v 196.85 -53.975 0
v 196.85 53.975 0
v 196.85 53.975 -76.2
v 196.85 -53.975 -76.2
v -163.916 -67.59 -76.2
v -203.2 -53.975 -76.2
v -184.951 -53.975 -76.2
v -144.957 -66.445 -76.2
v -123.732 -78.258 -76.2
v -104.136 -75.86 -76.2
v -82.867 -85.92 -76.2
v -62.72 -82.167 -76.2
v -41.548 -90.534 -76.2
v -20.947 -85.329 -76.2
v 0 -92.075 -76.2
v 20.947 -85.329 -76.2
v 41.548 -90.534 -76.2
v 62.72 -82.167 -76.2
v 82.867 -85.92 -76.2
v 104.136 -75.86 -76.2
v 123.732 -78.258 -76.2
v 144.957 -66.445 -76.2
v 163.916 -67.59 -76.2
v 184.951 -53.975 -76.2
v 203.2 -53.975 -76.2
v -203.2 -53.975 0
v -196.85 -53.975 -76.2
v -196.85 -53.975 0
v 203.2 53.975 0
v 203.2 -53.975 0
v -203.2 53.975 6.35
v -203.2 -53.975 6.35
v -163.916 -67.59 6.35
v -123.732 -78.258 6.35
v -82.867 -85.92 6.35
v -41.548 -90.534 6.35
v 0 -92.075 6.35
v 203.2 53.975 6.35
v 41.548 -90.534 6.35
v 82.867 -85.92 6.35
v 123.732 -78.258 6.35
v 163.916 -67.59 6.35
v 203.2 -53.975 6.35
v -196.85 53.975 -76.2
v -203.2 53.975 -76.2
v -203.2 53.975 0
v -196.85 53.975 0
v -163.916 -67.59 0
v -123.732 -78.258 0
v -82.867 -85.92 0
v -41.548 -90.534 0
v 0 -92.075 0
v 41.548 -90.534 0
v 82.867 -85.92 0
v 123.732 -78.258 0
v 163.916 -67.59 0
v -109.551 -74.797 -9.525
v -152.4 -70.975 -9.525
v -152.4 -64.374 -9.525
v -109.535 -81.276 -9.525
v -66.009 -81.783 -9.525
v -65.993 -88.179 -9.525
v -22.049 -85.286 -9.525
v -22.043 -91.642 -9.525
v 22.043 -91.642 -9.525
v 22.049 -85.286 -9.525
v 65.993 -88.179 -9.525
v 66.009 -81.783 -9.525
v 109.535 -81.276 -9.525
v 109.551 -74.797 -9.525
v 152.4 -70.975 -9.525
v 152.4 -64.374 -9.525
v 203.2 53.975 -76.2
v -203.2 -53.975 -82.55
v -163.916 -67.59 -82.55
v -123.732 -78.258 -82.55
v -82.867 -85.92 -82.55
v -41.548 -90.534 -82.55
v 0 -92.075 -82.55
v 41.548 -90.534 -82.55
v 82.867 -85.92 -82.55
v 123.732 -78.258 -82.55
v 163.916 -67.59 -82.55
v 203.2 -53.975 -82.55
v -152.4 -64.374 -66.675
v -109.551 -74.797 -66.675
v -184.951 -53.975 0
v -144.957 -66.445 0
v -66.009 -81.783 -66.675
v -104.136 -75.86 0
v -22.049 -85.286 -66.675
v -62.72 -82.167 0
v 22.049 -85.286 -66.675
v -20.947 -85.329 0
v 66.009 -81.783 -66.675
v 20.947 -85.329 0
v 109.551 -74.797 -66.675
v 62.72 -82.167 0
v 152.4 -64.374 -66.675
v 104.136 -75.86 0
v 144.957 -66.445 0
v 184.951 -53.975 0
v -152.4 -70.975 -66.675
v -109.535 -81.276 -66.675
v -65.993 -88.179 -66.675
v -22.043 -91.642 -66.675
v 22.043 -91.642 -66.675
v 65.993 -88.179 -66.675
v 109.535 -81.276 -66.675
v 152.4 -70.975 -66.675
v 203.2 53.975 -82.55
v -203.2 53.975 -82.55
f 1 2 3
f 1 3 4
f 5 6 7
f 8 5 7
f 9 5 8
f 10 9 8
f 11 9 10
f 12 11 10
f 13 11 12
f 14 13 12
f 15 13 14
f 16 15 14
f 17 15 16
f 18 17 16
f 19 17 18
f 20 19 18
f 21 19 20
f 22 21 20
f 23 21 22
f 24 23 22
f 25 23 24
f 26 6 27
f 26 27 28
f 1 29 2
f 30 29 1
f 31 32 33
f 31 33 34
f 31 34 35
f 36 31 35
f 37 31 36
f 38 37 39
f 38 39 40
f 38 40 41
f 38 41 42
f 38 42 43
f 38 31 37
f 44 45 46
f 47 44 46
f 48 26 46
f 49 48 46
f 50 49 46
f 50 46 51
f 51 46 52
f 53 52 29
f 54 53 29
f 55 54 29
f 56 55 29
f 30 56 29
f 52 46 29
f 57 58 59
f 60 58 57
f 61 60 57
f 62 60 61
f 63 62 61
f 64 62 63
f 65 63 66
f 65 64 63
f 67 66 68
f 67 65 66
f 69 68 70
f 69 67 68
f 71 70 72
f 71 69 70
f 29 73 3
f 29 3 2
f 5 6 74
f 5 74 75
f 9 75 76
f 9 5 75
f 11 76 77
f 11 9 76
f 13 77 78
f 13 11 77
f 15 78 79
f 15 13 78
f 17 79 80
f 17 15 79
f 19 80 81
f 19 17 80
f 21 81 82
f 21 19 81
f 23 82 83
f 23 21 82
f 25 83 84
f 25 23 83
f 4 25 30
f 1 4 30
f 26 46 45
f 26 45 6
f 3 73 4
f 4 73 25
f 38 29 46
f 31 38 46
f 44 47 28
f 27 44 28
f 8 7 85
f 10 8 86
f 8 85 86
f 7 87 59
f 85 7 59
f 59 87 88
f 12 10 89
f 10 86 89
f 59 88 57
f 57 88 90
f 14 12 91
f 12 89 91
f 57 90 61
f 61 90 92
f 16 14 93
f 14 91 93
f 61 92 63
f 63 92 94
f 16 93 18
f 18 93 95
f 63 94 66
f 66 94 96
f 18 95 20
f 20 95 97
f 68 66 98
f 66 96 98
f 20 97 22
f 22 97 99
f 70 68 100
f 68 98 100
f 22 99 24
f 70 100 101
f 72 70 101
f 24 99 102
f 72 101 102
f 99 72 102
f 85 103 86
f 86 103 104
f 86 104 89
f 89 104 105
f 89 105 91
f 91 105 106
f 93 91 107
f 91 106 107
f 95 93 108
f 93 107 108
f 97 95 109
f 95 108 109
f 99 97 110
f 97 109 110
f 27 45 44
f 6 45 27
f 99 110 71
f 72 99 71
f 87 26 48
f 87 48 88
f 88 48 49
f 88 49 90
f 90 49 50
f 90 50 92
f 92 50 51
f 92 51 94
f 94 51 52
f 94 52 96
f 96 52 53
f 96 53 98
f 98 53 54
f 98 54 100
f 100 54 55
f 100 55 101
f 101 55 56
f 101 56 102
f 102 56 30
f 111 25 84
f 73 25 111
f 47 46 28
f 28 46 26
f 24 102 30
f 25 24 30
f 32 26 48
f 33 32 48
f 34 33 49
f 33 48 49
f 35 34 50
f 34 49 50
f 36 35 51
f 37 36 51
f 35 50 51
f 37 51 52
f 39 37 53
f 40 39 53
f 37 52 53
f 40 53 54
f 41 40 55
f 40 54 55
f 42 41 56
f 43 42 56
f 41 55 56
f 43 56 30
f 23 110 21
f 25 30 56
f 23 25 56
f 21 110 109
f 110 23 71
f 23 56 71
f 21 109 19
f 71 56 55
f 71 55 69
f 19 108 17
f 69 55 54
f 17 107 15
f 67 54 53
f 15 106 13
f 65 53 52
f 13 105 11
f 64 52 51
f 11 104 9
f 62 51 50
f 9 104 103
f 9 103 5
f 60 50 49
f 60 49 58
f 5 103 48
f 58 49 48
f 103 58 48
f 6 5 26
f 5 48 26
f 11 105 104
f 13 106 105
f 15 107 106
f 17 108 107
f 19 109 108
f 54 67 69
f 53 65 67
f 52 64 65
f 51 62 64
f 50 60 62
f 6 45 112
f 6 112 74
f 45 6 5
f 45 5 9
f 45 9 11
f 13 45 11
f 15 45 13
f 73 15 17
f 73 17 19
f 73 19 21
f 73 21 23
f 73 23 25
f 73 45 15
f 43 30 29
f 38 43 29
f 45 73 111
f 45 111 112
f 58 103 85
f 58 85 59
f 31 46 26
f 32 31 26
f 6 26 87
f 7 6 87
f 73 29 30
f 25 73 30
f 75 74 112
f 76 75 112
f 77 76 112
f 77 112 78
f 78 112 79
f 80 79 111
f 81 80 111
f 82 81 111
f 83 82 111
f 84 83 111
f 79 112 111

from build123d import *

# Parameters (mm, degrees)
F1_DEPTH  = 6.35
F3_DEPTH  = 76.2
F6_W      = 107.95
F6_H      = 76.2
F7_DEPTH  = 6.35
F10_W     = 304.8
F10_H     = 57.15
F11_DEPTH = 146.051


with BuildPart() as f1:
    # F0 (on Top) → F1 (new body)
    with BuildSketch(Plane.XY):
        with BuildLine():
            Line((203.2, -53.975), (203.2, 53.975))
            Line((203.2, 53.975), (-203.2, 53.975))
            Line((-203.2, 53.975), (-203.2, -53.975))
            ThreePointArc((-203.2, -53.975), (0, -92.075), (203.2, -53.975))
        make_face()
    extrude(amount=F1_DEPTH)


with BuildPart() as f3:
    # F2 (on face) → F3 (new body)
    with BuildSketch(Plane(origin=(0, 0, 0), x_dir=(1, 0, 0), z_dir=(0, 0, -1))):
        with BuildLine():
            ThreePointArc((-184.9511369021, 53.975), (0, 85.7250019908), (184.9511369021, 53.975))
            Line((184.9511369021, 53.975), (203.2, 53.975))
            ThreePointArc((203.2, 53.975), (0, 92.075), (-203.2, 53.975))
            Line((-203.2, 53.975), (-184.9511369021, 53.975))
        make_face()
    extrude(amount=F3_DEPTH)

    # F10 (on offset) → F11 (cut, through all)
    with BuildSketch(Plane.XZ.offset(92.075)):
        with Locations((0, -38.1)):
            Rectangle(F10_W, F10_H)
    extrude(amount=-F11_DEPTH, mode=Mode.SUBTRACT)


with BuildPart() as f5_1:
    # F5: instance of F1
    add(f1.part.mirror(Plane(origin=(0, -13.2670479087, -38.1), x_dir=(1, 0, 0), z_dir=(0, 0, -1))))


with BuildPart() as f7:
    # F6 (on face) → F7 (new body)
    with BuildSketch(Plane(origin=(-203.2, 0, 0), x_dir=(0, -1, 0), z_dir=(-1, 0, 0))):
        with Locations((0, -38.1)):
            Rectangle(F6_W, F6_H)
    extrude(amount=-F7_DEPTH)


with BuildPart() as f8_1:
    # F8: instance of F7
    add(f7.part.mirror(Plane.YZ))


solid = Compound([f1.part, f3.part, f5_1.part, f7.part, f8_1.part])
